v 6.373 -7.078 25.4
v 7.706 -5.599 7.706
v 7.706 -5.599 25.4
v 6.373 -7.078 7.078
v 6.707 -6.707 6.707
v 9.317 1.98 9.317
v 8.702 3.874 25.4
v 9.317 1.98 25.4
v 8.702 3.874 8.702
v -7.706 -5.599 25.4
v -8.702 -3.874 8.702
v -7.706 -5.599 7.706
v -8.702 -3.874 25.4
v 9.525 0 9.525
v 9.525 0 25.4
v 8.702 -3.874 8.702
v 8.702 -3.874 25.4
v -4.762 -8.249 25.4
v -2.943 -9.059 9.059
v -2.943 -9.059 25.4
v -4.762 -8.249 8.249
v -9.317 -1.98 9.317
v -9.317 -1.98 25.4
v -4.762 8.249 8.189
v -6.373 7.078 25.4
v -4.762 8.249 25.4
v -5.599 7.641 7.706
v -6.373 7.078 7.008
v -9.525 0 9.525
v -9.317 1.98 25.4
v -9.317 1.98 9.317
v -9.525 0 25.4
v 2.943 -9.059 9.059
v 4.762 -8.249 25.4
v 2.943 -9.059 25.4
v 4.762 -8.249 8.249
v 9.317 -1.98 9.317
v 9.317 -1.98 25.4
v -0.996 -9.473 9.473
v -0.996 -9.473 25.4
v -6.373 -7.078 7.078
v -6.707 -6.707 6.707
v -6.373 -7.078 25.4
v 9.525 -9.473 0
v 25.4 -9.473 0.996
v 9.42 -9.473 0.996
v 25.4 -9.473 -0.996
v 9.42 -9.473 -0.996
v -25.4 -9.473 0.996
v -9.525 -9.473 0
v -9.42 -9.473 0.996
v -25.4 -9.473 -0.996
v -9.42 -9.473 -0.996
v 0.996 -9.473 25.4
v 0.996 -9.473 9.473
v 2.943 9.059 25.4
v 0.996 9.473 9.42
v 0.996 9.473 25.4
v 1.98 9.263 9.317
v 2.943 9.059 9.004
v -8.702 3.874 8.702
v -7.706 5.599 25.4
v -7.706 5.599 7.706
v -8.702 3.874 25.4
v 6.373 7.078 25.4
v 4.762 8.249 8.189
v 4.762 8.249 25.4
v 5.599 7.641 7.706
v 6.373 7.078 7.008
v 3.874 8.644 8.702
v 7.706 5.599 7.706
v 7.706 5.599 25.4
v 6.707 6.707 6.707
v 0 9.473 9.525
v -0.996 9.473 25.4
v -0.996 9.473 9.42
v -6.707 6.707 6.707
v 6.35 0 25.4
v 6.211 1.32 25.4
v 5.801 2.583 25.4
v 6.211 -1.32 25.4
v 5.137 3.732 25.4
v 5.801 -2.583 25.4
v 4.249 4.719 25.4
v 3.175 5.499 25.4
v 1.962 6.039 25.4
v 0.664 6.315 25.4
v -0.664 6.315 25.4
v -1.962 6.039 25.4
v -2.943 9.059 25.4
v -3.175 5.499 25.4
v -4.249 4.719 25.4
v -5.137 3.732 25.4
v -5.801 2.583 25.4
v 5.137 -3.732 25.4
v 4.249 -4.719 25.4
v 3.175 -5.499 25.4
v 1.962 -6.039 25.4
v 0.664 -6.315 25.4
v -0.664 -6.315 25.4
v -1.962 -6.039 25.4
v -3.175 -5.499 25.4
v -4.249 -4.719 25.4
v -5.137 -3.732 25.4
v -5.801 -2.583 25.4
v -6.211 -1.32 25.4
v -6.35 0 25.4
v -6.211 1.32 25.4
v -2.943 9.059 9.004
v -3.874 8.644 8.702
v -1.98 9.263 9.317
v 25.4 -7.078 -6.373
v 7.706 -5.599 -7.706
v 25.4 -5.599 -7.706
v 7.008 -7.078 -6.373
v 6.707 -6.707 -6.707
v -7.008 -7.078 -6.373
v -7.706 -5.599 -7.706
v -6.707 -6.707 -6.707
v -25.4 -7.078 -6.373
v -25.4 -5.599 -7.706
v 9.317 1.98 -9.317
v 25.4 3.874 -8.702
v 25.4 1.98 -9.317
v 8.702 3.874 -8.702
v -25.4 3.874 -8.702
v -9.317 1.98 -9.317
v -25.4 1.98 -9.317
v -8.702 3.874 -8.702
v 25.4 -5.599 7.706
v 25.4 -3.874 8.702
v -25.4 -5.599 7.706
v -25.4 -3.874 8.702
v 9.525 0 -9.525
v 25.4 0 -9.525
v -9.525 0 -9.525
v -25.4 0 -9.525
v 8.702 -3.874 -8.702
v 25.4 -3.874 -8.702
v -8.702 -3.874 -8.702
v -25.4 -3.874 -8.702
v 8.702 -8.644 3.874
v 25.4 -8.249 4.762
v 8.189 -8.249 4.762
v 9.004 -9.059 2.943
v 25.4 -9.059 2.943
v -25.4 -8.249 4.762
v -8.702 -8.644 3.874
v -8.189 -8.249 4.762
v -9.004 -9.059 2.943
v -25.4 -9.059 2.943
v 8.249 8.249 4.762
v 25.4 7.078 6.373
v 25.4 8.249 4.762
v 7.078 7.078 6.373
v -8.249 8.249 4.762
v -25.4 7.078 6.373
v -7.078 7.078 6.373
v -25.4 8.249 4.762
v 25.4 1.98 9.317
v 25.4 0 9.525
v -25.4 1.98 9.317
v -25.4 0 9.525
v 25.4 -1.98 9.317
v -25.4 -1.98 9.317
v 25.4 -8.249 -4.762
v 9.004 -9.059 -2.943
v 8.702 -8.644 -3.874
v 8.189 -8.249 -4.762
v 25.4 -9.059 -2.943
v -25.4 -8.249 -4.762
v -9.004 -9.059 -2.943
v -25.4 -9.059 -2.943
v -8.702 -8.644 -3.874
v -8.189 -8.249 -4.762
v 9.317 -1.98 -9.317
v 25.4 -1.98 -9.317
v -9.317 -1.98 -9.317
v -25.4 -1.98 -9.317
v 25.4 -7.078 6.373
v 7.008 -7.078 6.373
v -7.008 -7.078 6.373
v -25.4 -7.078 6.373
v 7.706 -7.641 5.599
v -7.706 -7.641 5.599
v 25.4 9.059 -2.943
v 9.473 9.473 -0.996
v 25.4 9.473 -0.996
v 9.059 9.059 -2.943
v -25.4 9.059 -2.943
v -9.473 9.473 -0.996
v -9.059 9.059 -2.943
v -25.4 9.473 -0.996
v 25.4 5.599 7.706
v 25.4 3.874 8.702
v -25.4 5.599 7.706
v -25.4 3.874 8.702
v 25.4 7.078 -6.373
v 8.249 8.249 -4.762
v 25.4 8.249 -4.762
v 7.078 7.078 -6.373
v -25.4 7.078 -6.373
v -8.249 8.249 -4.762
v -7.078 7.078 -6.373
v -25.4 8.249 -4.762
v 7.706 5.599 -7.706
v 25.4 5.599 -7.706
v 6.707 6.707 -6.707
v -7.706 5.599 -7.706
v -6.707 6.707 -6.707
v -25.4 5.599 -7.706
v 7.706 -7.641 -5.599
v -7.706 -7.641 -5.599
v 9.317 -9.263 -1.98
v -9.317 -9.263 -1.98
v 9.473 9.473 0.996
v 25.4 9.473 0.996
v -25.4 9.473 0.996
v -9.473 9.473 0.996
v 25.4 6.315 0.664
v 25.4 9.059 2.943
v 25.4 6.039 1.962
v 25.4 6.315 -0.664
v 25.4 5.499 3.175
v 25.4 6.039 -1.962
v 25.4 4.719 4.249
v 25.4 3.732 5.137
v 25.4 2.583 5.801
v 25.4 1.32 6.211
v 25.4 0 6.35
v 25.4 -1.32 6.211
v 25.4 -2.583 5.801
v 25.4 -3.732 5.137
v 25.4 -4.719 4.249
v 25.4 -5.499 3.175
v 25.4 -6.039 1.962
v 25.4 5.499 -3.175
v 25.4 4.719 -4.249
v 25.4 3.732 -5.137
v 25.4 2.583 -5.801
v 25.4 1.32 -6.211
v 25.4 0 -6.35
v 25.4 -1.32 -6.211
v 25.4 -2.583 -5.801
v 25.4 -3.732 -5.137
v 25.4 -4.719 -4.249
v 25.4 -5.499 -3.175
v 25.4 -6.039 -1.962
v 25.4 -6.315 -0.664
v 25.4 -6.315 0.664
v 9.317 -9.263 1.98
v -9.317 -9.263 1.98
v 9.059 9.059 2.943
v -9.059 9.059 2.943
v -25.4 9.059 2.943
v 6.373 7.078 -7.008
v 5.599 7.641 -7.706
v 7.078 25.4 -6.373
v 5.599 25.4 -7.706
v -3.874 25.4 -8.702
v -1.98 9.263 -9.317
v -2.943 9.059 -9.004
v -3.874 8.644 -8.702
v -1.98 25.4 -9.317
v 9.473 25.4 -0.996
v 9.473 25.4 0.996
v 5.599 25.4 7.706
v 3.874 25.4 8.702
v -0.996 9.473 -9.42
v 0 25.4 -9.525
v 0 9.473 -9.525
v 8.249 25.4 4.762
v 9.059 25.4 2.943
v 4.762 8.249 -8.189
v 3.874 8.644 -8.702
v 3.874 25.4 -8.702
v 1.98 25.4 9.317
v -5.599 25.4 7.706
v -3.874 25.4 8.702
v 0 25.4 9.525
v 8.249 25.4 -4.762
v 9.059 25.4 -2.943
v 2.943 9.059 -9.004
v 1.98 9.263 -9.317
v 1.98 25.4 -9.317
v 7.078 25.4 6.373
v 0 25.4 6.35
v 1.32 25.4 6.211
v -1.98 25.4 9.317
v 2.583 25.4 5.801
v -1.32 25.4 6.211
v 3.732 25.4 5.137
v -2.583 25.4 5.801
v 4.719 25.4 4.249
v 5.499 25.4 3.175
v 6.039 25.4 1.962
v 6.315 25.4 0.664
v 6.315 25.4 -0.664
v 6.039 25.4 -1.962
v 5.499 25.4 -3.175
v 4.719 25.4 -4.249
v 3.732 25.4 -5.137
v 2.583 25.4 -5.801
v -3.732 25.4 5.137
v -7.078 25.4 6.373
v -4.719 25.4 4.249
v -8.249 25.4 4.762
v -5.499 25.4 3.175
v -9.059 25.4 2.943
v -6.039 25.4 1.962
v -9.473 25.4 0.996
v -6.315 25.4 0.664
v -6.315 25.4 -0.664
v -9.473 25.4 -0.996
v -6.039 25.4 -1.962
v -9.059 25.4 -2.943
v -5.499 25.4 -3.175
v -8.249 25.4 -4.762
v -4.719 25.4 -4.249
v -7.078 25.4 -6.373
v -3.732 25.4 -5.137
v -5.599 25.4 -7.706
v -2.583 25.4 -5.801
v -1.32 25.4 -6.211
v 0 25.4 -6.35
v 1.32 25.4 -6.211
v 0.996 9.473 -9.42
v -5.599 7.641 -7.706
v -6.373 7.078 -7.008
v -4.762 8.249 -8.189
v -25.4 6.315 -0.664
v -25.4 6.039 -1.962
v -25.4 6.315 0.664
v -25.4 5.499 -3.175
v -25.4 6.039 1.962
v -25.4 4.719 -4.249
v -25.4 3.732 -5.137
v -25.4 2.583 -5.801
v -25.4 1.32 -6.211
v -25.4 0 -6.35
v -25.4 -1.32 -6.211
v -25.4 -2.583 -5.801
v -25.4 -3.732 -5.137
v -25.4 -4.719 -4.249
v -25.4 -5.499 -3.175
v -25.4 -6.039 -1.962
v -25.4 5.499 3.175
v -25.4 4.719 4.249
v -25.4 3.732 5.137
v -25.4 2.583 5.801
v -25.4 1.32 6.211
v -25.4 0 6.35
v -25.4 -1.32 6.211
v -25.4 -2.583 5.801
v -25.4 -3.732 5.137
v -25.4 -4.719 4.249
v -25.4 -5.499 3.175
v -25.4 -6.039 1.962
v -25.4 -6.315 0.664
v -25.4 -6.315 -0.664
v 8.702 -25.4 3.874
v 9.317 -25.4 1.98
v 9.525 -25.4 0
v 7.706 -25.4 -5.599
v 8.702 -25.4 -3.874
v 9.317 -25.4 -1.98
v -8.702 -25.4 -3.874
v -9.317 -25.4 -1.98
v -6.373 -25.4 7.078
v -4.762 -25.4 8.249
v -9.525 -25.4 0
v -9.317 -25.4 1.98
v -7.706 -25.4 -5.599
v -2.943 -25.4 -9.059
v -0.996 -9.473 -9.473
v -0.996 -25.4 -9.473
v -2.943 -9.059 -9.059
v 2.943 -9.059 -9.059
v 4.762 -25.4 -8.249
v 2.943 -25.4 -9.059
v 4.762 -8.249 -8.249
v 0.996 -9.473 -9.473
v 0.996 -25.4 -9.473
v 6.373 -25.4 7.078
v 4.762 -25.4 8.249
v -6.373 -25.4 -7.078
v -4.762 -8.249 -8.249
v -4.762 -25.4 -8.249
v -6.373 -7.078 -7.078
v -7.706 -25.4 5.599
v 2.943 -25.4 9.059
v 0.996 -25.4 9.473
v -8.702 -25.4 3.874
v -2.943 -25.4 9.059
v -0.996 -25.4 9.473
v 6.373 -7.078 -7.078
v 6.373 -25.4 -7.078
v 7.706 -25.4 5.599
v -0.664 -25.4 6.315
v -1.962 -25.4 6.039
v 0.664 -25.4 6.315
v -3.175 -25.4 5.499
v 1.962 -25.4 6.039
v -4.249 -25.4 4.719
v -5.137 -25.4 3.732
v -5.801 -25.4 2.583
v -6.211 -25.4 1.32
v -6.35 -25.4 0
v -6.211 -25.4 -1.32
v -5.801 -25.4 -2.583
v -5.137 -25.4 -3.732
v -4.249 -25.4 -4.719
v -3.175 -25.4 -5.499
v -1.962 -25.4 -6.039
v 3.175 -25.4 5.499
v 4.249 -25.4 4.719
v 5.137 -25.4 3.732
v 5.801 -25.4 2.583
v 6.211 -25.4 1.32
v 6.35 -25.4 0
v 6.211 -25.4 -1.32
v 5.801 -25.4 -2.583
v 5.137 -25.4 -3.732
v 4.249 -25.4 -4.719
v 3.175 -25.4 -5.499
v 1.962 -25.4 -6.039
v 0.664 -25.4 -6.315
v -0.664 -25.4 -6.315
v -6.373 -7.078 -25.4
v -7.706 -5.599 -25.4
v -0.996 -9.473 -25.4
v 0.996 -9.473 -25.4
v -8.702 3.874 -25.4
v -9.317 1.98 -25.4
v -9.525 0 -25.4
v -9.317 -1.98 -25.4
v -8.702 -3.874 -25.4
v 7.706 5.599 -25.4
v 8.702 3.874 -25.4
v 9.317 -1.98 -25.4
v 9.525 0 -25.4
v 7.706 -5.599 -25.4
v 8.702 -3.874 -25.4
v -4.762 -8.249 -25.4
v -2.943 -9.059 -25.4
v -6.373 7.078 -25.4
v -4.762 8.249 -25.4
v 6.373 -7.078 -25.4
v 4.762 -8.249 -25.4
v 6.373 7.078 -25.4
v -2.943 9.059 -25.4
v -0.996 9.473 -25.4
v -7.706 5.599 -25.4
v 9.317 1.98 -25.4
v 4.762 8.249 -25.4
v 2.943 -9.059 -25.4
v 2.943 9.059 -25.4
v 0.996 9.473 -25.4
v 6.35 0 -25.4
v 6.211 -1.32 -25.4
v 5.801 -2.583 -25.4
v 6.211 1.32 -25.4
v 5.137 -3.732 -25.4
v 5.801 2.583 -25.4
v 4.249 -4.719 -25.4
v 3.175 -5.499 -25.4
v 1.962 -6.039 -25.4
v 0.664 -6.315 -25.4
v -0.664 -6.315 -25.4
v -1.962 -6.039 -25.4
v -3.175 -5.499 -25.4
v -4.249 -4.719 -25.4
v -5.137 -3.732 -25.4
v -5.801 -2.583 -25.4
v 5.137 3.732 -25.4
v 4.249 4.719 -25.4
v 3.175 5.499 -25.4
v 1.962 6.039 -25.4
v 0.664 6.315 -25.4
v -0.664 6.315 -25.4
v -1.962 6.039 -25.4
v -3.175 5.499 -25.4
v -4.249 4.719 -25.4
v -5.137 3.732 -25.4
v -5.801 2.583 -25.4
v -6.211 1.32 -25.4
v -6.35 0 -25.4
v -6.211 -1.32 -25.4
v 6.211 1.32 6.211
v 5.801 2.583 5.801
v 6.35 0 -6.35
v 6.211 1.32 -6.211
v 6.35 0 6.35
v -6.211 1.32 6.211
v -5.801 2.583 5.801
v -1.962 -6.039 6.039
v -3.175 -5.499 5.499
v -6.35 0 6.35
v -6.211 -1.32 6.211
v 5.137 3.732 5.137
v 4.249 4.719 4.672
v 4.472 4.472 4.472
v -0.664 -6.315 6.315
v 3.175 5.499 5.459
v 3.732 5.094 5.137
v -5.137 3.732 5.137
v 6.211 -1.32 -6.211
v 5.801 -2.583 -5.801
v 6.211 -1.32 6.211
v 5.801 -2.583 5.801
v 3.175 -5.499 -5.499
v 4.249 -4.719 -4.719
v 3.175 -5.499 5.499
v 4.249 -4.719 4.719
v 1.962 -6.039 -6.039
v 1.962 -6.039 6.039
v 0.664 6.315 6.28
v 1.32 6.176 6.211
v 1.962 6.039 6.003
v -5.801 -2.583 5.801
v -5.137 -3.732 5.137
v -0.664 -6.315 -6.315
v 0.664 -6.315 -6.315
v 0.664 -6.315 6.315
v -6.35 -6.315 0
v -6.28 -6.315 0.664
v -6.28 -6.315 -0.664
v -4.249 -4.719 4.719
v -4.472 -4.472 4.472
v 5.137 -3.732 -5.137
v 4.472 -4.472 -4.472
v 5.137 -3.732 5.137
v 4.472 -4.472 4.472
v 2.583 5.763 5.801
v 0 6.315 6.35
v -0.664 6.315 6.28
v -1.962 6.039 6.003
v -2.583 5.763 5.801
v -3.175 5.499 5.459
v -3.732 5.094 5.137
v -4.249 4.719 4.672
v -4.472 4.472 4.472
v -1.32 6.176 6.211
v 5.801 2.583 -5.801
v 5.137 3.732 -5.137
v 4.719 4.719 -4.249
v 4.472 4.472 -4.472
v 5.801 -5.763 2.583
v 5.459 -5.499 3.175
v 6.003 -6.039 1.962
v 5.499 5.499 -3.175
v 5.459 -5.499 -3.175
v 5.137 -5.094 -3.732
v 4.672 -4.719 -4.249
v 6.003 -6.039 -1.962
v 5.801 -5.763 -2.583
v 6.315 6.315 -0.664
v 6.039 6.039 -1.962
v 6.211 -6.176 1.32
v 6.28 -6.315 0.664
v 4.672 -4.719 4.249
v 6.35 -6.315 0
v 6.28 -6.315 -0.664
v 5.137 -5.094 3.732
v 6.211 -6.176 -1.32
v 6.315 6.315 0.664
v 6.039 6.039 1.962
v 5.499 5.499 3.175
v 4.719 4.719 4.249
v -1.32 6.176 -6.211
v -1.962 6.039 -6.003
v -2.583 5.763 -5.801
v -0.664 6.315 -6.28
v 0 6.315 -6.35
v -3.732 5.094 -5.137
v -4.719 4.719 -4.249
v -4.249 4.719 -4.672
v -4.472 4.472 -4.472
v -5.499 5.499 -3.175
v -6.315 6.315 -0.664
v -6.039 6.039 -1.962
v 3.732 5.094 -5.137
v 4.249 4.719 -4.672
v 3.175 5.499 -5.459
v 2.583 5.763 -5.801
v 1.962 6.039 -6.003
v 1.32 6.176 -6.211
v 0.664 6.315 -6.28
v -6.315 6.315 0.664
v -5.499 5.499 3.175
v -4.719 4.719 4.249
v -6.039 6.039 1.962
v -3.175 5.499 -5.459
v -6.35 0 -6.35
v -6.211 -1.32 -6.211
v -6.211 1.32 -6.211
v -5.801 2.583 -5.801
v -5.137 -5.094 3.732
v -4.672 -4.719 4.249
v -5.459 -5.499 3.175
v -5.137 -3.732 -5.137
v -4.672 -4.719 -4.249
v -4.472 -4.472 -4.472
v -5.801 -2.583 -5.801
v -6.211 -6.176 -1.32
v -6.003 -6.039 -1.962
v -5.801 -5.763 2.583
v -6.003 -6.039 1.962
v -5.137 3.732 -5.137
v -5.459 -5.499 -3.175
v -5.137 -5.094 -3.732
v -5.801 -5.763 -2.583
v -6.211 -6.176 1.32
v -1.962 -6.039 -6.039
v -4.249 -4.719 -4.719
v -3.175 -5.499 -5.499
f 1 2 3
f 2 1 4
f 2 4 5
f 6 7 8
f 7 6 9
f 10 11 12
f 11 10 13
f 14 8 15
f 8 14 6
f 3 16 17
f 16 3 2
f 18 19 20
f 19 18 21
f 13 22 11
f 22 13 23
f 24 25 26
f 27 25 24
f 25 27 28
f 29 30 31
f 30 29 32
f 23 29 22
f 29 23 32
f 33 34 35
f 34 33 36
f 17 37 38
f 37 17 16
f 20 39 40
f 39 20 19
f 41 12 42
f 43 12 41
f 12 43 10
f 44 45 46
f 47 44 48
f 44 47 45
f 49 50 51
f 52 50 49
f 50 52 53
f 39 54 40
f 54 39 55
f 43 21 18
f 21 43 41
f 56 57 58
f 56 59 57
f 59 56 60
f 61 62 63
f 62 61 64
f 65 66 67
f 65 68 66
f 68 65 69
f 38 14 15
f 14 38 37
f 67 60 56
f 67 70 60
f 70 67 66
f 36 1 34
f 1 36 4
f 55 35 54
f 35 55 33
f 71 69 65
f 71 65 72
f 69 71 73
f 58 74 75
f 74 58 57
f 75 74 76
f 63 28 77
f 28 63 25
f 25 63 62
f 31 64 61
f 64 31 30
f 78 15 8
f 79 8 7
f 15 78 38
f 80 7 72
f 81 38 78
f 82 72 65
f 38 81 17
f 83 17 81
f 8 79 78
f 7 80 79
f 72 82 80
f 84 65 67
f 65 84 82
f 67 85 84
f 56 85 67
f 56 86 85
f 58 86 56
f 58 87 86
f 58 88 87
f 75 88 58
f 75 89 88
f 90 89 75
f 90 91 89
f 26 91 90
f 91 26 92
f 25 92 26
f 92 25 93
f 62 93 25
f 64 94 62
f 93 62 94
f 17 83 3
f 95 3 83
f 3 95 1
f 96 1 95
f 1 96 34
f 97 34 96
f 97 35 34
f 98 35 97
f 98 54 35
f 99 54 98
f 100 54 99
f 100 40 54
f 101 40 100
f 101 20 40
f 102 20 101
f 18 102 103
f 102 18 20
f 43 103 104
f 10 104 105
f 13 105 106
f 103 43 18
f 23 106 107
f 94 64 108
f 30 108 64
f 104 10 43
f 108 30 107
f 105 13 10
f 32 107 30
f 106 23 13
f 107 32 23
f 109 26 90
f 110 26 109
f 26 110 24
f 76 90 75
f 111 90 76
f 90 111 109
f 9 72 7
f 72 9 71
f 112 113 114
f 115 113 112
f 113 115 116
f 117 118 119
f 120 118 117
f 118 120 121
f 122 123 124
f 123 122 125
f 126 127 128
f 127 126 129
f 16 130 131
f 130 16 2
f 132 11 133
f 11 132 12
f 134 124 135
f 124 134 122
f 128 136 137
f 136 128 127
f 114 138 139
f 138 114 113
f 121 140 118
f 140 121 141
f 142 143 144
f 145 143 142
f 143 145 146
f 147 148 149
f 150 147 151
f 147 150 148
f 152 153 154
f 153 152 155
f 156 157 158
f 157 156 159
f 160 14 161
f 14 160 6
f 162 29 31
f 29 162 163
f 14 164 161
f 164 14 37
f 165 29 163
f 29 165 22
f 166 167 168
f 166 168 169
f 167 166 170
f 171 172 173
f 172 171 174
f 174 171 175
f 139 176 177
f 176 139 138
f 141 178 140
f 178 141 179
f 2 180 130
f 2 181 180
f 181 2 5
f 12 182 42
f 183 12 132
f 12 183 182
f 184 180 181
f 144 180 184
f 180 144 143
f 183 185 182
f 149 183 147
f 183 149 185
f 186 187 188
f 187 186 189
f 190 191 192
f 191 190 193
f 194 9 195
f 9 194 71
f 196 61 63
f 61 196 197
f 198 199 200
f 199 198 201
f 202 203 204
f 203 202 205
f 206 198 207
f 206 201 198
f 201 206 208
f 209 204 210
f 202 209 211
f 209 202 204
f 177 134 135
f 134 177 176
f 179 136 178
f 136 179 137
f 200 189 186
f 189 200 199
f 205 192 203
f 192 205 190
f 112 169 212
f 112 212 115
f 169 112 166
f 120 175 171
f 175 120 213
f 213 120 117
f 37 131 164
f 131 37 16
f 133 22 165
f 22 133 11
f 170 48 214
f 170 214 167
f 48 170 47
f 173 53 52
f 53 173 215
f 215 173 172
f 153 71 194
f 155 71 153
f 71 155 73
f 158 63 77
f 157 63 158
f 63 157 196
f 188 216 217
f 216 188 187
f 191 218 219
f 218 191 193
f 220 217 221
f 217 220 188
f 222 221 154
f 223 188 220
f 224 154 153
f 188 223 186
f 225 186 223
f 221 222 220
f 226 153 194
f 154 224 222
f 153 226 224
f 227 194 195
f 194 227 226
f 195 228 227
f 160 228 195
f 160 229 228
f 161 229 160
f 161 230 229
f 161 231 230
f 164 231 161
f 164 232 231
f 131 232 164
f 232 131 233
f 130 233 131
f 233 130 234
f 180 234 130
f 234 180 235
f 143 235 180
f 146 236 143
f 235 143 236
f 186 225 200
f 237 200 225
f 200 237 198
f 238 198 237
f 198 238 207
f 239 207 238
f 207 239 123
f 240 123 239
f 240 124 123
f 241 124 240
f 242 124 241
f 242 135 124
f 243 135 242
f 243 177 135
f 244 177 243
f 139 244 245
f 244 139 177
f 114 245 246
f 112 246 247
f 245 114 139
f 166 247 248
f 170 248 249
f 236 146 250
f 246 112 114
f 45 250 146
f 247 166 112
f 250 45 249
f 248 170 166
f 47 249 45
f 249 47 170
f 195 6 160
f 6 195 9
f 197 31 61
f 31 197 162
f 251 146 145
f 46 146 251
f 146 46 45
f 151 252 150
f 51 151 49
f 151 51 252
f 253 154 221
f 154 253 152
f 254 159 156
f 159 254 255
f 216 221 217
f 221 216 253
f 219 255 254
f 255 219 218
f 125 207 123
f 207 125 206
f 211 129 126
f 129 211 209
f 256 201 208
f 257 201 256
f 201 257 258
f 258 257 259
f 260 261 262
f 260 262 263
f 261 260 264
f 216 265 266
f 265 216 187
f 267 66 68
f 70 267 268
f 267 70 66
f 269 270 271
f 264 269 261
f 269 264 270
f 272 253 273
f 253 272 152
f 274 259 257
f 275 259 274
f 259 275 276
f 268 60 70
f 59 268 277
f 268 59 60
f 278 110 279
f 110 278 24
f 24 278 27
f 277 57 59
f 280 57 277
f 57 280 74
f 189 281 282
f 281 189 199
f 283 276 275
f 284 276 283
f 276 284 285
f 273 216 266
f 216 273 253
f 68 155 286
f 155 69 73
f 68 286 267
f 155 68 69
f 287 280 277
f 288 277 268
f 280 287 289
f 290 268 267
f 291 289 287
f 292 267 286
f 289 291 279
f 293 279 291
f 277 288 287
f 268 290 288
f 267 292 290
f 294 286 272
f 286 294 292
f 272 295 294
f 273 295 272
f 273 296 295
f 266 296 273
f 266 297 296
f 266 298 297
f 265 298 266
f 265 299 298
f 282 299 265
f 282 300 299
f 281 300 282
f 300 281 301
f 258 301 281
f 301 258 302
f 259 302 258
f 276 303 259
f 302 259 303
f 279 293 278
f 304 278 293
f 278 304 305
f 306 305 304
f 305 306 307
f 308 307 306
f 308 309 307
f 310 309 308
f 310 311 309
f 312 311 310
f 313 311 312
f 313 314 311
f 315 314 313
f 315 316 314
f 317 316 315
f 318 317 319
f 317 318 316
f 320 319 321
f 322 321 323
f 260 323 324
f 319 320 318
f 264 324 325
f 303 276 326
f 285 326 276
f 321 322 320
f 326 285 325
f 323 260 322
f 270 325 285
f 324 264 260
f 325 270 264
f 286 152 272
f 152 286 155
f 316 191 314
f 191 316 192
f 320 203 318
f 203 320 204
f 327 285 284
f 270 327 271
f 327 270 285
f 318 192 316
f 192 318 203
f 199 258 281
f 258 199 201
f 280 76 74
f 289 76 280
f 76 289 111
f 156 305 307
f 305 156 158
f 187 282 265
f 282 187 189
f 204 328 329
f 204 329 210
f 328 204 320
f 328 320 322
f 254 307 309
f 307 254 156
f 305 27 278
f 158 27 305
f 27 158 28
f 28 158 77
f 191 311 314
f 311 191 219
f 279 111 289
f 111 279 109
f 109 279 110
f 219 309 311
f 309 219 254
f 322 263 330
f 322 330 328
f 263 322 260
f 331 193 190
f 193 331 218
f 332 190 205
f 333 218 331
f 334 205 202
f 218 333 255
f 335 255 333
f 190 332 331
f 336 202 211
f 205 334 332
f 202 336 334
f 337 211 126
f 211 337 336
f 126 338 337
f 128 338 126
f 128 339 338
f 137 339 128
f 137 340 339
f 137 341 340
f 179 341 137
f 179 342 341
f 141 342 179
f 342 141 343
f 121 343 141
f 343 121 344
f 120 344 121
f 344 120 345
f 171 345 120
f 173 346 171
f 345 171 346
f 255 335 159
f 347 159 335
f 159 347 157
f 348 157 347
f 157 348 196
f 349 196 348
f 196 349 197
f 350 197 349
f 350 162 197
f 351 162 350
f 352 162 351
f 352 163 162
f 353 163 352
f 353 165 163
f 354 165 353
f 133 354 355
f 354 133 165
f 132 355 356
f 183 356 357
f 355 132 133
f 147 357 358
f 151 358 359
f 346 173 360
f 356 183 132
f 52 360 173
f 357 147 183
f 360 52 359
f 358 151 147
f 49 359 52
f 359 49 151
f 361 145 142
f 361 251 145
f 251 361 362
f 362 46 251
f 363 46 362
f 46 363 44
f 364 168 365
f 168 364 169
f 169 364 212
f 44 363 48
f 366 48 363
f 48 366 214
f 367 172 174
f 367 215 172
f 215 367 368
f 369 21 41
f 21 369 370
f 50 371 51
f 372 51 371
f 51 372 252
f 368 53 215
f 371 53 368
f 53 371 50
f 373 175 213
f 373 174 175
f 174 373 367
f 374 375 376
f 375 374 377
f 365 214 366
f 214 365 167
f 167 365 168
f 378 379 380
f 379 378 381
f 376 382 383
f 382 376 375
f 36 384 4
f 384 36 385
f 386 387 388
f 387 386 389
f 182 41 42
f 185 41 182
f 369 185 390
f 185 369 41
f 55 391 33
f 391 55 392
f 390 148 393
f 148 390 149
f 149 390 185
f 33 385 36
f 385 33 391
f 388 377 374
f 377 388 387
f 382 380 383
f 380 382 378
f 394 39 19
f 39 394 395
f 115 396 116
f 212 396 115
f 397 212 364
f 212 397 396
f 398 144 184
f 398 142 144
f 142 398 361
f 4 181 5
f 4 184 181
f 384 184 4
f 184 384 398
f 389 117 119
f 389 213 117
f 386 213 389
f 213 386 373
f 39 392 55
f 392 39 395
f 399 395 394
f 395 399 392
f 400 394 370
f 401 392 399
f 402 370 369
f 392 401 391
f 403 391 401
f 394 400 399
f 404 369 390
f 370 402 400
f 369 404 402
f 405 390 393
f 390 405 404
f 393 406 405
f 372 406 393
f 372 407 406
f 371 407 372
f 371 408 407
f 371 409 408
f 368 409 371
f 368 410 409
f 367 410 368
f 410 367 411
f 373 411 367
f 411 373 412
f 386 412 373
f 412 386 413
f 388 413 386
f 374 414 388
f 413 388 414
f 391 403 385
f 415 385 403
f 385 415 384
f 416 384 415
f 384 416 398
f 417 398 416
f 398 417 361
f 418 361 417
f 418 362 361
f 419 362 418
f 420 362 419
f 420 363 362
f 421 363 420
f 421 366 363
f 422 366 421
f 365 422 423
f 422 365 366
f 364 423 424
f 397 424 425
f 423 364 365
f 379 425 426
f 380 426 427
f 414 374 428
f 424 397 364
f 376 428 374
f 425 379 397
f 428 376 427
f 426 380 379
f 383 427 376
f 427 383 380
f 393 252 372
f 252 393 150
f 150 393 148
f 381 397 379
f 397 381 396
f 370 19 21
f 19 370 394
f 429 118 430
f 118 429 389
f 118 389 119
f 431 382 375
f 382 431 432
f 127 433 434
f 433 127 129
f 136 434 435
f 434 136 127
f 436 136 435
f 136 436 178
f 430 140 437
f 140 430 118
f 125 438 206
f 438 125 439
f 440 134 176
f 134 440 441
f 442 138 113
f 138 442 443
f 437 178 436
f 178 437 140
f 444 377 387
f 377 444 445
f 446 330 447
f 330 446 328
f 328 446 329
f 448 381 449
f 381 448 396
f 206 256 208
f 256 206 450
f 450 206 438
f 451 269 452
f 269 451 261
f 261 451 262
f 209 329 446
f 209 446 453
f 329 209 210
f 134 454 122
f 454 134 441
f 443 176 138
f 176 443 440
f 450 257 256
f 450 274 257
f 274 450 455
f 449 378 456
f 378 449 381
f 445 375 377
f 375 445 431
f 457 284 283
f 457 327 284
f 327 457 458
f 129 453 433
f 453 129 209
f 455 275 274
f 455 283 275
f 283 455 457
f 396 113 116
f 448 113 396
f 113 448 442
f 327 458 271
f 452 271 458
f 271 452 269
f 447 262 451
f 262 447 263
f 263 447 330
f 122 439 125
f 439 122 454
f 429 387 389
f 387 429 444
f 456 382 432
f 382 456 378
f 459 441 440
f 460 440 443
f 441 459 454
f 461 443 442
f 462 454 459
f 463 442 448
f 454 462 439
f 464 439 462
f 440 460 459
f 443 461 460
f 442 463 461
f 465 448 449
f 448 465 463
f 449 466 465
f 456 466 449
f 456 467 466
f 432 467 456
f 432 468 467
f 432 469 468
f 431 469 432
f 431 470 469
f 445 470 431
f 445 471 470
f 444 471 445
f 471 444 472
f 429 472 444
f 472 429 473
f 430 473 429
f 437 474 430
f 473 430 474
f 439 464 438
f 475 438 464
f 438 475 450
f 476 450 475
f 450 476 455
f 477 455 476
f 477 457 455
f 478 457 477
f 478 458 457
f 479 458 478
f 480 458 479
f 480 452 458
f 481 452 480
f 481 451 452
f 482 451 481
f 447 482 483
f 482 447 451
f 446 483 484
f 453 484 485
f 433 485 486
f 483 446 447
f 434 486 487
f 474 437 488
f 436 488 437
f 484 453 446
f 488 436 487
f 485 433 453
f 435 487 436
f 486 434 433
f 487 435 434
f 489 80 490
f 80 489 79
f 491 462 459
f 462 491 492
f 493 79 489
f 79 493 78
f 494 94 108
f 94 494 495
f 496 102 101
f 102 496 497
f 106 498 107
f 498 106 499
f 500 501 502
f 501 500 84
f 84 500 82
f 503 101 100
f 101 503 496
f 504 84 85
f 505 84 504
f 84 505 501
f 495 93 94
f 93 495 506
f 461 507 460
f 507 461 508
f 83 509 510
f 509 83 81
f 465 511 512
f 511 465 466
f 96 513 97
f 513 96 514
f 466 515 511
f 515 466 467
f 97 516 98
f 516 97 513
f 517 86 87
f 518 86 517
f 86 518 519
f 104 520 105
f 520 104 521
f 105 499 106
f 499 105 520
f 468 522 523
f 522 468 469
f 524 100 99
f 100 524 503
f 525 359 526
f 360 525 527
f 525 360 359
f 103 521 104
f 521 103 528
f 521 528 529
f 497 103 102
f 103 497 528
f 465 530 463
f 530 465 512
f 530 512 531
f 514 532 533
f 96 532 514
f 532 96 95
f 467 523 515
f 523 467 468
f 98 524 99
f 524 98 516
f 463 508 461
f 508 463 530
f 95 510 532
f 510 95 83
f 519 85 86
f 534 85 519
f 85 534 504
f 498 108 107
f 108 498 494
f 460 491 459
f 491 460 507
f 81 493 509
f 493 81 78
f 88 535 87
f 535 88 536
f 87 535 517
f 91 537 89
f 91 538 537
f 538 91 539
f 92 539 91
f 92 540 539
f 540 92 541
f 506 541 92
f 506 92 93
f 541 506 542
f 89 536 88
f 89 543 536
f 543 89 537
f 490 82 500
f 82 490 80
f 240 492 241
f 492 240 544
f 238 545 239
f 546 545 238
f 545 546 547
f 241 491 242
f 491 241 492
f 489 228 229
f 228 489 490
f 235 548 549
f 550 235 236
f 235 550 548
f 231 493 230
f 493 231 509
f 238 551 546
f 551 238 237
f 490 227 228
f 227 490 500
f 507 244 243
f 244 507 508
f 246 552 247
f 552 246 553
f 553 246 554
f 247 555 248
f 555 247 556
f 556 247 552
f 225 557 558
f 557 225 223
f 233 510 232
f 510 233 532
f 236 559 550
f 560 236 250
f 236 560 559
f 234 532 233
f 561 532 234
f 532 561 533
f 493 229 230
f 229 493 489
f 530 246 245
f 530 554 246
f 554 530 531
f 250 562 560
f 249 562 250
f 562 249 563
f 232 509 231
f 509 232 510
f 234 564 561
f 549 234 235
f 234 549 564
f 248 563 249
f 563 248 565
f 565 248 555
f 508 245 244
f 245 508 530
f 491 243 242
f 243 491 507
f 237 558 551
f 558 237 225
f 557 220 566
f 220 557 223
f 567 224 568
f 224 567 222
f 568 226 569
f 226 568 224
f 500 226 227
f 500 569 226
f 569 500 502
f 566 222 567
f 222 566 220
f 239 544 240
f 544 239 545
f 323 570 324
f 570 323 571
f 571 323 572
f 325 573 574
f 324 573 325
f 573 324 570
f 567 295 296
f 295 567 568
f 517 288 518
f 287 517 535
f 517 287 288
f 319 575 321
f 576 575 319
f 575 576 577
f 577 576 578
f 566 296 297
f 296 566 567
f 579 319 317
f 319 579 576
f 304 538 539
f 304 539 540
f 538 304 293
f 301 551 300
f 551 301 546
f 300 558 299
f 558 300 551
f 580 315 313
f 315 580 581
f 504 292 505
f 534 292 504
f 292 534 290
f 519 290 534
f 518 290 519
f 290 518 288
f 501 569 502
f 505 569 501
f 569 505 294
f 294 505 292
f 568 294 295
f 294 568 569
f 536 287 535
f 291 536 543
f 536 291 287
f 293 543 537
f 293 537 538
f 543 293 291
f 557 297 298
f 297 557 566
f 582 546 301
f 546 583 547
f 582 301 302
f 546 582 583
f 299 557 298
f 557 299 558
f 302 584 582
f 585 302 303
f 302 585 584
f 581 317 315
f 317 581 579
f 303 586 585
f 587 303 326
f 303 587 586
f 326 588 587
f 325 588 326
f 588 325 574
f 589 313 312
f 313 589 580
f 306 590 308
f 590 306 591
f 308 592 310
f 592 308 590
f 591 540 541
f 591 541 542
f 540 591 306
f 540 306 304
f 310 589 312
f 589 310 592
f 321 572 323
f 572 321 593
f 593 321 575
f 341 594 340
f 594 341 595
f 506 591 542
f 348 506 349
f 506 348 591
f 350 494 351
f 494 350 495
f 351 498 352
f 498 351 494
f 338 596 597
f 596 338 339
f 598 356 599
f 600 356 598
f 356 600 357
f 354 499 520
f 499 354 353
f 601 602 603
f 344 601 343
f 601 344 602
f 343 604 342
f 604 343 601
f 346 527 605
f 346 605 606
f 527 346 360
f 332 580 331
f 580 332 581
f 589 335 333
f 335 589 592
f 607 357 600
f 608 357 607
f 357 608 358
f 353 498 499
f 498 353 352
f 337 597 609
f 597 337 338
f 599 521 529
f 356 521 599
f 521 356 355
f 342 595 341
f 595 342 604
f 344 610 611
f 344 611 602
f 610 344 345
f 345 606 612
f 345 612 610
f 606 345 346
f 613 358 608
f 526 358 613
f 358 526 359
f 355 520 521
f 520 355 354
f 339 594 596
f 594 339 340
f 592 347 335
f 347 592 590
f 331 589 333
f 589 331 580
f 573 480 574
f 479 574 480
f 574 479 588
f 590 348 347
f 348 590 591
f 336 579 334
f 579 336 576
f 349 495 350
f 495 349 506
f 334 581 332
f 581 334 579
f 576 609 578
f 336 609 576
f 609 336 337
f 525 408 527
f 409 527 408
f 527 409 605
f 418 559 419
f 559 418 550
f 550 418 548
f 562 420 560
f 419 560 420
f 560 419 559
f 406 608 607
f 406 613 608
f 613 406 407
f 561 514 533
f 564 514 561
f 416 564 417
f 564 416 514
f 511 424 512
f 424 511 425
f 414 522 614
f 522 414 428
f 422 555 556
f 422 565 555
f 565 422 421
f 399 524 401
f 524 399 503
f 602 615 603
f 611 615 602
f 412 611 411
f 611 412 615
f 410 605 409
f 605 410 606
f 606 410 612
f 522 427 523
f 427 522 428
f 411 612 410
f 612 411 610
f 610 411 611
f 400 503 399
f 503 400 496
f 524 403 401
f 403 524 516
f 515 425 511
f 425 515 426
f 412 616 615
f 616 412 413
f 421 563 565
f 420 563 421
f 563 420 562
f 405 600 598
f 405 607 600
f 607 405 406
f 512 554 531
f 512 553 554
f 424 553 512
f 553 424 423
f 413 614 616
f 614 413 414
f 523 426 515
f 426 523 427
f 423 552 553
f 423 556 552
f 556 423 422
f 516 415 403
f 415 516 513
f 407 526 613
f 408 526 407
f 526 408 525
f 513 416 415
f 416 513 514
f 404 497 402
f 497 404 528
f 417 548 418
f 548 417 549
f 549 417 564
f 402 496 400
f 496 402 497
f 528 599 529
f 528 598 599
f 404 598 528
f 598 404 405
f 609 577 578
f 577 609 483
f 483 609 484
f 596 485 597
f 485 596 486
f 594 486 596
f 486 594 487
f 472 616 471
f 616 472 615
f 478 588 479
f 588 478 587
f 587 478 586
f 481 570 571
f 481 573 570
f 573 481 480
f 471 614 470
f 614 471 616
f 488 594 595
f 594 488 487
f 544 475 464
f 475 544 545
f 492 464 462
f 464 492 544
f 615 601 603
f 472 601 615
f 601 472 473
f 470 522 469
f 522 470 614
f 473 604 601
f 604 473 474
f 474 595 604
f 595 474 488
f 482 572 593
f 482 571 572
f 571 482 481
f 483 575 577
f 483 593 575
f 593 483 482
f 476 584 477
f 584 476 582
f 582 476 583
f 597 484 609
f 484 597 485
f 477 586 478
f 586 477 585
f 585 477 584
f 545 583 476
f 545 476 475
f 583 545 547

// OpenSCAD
//for kites :)
/*[Universal Features]*/
outter_diameter = .375;
//aka what is the skiniest you will want this to be regardless of what you enter.
minimum_shell = .0625;
minimum_length = 1;
/*[units]*/
//Basically are you using american units or real units
units_entered = 25.4;//[1:mm, 10:cm, 1000:meter, 25.4:inch, 304.8:foot]
//default is mm for most printers
desired_units_for_output = 1;//[1:mm, .1:cm, 0.001:meter, 0.0393701:inch, 0.00328084:foot]

/*[arm 1]*/
arm_1_length = 1;
arm_1_inner_diameter = 0.25;
//x,y,z
arm_1_angle = [0,0,0];
//color in rgb values
arm_1_color = [1,0,0];
/*[arm 2]*/
arm_2_length = 1;
arm_2_inner_diameter = 0.25;
//x,y,z
arm_2_angle = [0,90,0];
//color in rgb values
arm_2_color = [0,1,0];
/*[arm 3]*/
arm_3_length = 1;
arm_3_inner_diameter = 0.25;
//x,y,z
arm_3_angle = [0,90,90];
//color in rgb values
arm_3_color = [0,0,1];
/*[arm 4]*/
arm_4_length = 1;
arm_4_inner_diameter = 0.25;
//x,y,z
arm_4_angle = [0,-90,0];
//color in rgb values
arm_4_color = [1,1,0];
/*[arm 5]*/
arm_5_length = 1;
arm_5_inner_diameter = 0.25;
//x,y,z
arm_5_angle = [90,0,0];
//color in rgb values
arm_5_color = [1,0,1];
/*[arm 6]*/
arm_6_length = 1;
arm_6_inner_diameter = 0.25;
//x,y,z
arm_6_angle = [0,180,0];
//color in rgb values
arm_6_color = [0,1,1];
/*[arm 7]*/
arm_7_length = 0;
arm_7_inner_diameter = 0.25;
//x,y,z
arm_7_angle = [0,0,0];
//color in rgb values
arm_7_color = [1,1,1];
/*[arm 8]*/
arm_8_length = 0;
arm_8_inner_diameter = 0.25;
//x,y,z
arm_8_angle = [0,0,0];
//color in rgb values
arm_8_color = [.5,.5,0];
/*[arm 9]*/
arm_9_length = 0;
arm_9_inner_diameter = 0.25;
//x,y,z
arm_9_angle = [0,0,0];
//color in rgb values
arm_9_color = [0,.5,.5];
/*[arm 10]*/
arm_10_length = 0;
arm_10_inner_diameter = 0.25;
//x,y,z
arm_10_angle = [0,0,0];
//color in rgb values
arm_10_color = [.5,0,.5];

array_to_reference = 
[[arm_1_length,arm_1_inner_diameter,arm_1_angle,arm_1_color],[arm_2_length,arm_2_inner_diameter,arm_2_angle,arm_2_color],[arm_3_length,arm_3_inner_diameter,arm_3_angle,arm_3_color],[arm_4_length,arm_4_inner_diameter,arm_4_angle,arm_4_color],[arm_5_length,arm_5_inner_diameter,arm_5_angle,arm_5_color],[arm_6_length,arm_6_inner_diameter,arm_6_angle,arm_6_color],[arm_7_length,arm_7_inner_diameter,arm_7_angle,arm_7_color],[arm_8_length,arm_8_inner_diameter,arm_8_angle,arm_8_color],[arm_9_length,arm_9_inner_diameter,arm_9_angle,arm_9_color],[arm_10_length,arm_10_inner_diameter,arm_10_angle,arm_10_color]];
unit_conversion_factor = units_entered*desired_units_for_output;

scale(unit_conversion_factor){
	difference(){
		union(){
			sphere(outter_diameter,$fs=.05);
			for(current_arm = [0:9]){
				rotate(array_to_reference[current_arm][2]){
					difference(){
						if(true){
							color(array_to_reference[current_arm][3]){
								linear_extrude(array_to_reference[current_arm][0]){
									circle(outter_diameter,$fs = .05);
								}
							}
						}
					}
				}
			}
		}
		union(){
			for(current_arm = [0:9]){
				rotate(array_to_reference[current_arm][2]){
					translate([0,0,-.01]){
						color(array_to_reference[current_arm][3]*.9){
							linear_extrude(array_to_reference[current_arm][0]+.02){
								circle(array_to_reference[current_arm][1],$fs = .025);
							}	
						}
					}
				}
			}
		}
	}
}
